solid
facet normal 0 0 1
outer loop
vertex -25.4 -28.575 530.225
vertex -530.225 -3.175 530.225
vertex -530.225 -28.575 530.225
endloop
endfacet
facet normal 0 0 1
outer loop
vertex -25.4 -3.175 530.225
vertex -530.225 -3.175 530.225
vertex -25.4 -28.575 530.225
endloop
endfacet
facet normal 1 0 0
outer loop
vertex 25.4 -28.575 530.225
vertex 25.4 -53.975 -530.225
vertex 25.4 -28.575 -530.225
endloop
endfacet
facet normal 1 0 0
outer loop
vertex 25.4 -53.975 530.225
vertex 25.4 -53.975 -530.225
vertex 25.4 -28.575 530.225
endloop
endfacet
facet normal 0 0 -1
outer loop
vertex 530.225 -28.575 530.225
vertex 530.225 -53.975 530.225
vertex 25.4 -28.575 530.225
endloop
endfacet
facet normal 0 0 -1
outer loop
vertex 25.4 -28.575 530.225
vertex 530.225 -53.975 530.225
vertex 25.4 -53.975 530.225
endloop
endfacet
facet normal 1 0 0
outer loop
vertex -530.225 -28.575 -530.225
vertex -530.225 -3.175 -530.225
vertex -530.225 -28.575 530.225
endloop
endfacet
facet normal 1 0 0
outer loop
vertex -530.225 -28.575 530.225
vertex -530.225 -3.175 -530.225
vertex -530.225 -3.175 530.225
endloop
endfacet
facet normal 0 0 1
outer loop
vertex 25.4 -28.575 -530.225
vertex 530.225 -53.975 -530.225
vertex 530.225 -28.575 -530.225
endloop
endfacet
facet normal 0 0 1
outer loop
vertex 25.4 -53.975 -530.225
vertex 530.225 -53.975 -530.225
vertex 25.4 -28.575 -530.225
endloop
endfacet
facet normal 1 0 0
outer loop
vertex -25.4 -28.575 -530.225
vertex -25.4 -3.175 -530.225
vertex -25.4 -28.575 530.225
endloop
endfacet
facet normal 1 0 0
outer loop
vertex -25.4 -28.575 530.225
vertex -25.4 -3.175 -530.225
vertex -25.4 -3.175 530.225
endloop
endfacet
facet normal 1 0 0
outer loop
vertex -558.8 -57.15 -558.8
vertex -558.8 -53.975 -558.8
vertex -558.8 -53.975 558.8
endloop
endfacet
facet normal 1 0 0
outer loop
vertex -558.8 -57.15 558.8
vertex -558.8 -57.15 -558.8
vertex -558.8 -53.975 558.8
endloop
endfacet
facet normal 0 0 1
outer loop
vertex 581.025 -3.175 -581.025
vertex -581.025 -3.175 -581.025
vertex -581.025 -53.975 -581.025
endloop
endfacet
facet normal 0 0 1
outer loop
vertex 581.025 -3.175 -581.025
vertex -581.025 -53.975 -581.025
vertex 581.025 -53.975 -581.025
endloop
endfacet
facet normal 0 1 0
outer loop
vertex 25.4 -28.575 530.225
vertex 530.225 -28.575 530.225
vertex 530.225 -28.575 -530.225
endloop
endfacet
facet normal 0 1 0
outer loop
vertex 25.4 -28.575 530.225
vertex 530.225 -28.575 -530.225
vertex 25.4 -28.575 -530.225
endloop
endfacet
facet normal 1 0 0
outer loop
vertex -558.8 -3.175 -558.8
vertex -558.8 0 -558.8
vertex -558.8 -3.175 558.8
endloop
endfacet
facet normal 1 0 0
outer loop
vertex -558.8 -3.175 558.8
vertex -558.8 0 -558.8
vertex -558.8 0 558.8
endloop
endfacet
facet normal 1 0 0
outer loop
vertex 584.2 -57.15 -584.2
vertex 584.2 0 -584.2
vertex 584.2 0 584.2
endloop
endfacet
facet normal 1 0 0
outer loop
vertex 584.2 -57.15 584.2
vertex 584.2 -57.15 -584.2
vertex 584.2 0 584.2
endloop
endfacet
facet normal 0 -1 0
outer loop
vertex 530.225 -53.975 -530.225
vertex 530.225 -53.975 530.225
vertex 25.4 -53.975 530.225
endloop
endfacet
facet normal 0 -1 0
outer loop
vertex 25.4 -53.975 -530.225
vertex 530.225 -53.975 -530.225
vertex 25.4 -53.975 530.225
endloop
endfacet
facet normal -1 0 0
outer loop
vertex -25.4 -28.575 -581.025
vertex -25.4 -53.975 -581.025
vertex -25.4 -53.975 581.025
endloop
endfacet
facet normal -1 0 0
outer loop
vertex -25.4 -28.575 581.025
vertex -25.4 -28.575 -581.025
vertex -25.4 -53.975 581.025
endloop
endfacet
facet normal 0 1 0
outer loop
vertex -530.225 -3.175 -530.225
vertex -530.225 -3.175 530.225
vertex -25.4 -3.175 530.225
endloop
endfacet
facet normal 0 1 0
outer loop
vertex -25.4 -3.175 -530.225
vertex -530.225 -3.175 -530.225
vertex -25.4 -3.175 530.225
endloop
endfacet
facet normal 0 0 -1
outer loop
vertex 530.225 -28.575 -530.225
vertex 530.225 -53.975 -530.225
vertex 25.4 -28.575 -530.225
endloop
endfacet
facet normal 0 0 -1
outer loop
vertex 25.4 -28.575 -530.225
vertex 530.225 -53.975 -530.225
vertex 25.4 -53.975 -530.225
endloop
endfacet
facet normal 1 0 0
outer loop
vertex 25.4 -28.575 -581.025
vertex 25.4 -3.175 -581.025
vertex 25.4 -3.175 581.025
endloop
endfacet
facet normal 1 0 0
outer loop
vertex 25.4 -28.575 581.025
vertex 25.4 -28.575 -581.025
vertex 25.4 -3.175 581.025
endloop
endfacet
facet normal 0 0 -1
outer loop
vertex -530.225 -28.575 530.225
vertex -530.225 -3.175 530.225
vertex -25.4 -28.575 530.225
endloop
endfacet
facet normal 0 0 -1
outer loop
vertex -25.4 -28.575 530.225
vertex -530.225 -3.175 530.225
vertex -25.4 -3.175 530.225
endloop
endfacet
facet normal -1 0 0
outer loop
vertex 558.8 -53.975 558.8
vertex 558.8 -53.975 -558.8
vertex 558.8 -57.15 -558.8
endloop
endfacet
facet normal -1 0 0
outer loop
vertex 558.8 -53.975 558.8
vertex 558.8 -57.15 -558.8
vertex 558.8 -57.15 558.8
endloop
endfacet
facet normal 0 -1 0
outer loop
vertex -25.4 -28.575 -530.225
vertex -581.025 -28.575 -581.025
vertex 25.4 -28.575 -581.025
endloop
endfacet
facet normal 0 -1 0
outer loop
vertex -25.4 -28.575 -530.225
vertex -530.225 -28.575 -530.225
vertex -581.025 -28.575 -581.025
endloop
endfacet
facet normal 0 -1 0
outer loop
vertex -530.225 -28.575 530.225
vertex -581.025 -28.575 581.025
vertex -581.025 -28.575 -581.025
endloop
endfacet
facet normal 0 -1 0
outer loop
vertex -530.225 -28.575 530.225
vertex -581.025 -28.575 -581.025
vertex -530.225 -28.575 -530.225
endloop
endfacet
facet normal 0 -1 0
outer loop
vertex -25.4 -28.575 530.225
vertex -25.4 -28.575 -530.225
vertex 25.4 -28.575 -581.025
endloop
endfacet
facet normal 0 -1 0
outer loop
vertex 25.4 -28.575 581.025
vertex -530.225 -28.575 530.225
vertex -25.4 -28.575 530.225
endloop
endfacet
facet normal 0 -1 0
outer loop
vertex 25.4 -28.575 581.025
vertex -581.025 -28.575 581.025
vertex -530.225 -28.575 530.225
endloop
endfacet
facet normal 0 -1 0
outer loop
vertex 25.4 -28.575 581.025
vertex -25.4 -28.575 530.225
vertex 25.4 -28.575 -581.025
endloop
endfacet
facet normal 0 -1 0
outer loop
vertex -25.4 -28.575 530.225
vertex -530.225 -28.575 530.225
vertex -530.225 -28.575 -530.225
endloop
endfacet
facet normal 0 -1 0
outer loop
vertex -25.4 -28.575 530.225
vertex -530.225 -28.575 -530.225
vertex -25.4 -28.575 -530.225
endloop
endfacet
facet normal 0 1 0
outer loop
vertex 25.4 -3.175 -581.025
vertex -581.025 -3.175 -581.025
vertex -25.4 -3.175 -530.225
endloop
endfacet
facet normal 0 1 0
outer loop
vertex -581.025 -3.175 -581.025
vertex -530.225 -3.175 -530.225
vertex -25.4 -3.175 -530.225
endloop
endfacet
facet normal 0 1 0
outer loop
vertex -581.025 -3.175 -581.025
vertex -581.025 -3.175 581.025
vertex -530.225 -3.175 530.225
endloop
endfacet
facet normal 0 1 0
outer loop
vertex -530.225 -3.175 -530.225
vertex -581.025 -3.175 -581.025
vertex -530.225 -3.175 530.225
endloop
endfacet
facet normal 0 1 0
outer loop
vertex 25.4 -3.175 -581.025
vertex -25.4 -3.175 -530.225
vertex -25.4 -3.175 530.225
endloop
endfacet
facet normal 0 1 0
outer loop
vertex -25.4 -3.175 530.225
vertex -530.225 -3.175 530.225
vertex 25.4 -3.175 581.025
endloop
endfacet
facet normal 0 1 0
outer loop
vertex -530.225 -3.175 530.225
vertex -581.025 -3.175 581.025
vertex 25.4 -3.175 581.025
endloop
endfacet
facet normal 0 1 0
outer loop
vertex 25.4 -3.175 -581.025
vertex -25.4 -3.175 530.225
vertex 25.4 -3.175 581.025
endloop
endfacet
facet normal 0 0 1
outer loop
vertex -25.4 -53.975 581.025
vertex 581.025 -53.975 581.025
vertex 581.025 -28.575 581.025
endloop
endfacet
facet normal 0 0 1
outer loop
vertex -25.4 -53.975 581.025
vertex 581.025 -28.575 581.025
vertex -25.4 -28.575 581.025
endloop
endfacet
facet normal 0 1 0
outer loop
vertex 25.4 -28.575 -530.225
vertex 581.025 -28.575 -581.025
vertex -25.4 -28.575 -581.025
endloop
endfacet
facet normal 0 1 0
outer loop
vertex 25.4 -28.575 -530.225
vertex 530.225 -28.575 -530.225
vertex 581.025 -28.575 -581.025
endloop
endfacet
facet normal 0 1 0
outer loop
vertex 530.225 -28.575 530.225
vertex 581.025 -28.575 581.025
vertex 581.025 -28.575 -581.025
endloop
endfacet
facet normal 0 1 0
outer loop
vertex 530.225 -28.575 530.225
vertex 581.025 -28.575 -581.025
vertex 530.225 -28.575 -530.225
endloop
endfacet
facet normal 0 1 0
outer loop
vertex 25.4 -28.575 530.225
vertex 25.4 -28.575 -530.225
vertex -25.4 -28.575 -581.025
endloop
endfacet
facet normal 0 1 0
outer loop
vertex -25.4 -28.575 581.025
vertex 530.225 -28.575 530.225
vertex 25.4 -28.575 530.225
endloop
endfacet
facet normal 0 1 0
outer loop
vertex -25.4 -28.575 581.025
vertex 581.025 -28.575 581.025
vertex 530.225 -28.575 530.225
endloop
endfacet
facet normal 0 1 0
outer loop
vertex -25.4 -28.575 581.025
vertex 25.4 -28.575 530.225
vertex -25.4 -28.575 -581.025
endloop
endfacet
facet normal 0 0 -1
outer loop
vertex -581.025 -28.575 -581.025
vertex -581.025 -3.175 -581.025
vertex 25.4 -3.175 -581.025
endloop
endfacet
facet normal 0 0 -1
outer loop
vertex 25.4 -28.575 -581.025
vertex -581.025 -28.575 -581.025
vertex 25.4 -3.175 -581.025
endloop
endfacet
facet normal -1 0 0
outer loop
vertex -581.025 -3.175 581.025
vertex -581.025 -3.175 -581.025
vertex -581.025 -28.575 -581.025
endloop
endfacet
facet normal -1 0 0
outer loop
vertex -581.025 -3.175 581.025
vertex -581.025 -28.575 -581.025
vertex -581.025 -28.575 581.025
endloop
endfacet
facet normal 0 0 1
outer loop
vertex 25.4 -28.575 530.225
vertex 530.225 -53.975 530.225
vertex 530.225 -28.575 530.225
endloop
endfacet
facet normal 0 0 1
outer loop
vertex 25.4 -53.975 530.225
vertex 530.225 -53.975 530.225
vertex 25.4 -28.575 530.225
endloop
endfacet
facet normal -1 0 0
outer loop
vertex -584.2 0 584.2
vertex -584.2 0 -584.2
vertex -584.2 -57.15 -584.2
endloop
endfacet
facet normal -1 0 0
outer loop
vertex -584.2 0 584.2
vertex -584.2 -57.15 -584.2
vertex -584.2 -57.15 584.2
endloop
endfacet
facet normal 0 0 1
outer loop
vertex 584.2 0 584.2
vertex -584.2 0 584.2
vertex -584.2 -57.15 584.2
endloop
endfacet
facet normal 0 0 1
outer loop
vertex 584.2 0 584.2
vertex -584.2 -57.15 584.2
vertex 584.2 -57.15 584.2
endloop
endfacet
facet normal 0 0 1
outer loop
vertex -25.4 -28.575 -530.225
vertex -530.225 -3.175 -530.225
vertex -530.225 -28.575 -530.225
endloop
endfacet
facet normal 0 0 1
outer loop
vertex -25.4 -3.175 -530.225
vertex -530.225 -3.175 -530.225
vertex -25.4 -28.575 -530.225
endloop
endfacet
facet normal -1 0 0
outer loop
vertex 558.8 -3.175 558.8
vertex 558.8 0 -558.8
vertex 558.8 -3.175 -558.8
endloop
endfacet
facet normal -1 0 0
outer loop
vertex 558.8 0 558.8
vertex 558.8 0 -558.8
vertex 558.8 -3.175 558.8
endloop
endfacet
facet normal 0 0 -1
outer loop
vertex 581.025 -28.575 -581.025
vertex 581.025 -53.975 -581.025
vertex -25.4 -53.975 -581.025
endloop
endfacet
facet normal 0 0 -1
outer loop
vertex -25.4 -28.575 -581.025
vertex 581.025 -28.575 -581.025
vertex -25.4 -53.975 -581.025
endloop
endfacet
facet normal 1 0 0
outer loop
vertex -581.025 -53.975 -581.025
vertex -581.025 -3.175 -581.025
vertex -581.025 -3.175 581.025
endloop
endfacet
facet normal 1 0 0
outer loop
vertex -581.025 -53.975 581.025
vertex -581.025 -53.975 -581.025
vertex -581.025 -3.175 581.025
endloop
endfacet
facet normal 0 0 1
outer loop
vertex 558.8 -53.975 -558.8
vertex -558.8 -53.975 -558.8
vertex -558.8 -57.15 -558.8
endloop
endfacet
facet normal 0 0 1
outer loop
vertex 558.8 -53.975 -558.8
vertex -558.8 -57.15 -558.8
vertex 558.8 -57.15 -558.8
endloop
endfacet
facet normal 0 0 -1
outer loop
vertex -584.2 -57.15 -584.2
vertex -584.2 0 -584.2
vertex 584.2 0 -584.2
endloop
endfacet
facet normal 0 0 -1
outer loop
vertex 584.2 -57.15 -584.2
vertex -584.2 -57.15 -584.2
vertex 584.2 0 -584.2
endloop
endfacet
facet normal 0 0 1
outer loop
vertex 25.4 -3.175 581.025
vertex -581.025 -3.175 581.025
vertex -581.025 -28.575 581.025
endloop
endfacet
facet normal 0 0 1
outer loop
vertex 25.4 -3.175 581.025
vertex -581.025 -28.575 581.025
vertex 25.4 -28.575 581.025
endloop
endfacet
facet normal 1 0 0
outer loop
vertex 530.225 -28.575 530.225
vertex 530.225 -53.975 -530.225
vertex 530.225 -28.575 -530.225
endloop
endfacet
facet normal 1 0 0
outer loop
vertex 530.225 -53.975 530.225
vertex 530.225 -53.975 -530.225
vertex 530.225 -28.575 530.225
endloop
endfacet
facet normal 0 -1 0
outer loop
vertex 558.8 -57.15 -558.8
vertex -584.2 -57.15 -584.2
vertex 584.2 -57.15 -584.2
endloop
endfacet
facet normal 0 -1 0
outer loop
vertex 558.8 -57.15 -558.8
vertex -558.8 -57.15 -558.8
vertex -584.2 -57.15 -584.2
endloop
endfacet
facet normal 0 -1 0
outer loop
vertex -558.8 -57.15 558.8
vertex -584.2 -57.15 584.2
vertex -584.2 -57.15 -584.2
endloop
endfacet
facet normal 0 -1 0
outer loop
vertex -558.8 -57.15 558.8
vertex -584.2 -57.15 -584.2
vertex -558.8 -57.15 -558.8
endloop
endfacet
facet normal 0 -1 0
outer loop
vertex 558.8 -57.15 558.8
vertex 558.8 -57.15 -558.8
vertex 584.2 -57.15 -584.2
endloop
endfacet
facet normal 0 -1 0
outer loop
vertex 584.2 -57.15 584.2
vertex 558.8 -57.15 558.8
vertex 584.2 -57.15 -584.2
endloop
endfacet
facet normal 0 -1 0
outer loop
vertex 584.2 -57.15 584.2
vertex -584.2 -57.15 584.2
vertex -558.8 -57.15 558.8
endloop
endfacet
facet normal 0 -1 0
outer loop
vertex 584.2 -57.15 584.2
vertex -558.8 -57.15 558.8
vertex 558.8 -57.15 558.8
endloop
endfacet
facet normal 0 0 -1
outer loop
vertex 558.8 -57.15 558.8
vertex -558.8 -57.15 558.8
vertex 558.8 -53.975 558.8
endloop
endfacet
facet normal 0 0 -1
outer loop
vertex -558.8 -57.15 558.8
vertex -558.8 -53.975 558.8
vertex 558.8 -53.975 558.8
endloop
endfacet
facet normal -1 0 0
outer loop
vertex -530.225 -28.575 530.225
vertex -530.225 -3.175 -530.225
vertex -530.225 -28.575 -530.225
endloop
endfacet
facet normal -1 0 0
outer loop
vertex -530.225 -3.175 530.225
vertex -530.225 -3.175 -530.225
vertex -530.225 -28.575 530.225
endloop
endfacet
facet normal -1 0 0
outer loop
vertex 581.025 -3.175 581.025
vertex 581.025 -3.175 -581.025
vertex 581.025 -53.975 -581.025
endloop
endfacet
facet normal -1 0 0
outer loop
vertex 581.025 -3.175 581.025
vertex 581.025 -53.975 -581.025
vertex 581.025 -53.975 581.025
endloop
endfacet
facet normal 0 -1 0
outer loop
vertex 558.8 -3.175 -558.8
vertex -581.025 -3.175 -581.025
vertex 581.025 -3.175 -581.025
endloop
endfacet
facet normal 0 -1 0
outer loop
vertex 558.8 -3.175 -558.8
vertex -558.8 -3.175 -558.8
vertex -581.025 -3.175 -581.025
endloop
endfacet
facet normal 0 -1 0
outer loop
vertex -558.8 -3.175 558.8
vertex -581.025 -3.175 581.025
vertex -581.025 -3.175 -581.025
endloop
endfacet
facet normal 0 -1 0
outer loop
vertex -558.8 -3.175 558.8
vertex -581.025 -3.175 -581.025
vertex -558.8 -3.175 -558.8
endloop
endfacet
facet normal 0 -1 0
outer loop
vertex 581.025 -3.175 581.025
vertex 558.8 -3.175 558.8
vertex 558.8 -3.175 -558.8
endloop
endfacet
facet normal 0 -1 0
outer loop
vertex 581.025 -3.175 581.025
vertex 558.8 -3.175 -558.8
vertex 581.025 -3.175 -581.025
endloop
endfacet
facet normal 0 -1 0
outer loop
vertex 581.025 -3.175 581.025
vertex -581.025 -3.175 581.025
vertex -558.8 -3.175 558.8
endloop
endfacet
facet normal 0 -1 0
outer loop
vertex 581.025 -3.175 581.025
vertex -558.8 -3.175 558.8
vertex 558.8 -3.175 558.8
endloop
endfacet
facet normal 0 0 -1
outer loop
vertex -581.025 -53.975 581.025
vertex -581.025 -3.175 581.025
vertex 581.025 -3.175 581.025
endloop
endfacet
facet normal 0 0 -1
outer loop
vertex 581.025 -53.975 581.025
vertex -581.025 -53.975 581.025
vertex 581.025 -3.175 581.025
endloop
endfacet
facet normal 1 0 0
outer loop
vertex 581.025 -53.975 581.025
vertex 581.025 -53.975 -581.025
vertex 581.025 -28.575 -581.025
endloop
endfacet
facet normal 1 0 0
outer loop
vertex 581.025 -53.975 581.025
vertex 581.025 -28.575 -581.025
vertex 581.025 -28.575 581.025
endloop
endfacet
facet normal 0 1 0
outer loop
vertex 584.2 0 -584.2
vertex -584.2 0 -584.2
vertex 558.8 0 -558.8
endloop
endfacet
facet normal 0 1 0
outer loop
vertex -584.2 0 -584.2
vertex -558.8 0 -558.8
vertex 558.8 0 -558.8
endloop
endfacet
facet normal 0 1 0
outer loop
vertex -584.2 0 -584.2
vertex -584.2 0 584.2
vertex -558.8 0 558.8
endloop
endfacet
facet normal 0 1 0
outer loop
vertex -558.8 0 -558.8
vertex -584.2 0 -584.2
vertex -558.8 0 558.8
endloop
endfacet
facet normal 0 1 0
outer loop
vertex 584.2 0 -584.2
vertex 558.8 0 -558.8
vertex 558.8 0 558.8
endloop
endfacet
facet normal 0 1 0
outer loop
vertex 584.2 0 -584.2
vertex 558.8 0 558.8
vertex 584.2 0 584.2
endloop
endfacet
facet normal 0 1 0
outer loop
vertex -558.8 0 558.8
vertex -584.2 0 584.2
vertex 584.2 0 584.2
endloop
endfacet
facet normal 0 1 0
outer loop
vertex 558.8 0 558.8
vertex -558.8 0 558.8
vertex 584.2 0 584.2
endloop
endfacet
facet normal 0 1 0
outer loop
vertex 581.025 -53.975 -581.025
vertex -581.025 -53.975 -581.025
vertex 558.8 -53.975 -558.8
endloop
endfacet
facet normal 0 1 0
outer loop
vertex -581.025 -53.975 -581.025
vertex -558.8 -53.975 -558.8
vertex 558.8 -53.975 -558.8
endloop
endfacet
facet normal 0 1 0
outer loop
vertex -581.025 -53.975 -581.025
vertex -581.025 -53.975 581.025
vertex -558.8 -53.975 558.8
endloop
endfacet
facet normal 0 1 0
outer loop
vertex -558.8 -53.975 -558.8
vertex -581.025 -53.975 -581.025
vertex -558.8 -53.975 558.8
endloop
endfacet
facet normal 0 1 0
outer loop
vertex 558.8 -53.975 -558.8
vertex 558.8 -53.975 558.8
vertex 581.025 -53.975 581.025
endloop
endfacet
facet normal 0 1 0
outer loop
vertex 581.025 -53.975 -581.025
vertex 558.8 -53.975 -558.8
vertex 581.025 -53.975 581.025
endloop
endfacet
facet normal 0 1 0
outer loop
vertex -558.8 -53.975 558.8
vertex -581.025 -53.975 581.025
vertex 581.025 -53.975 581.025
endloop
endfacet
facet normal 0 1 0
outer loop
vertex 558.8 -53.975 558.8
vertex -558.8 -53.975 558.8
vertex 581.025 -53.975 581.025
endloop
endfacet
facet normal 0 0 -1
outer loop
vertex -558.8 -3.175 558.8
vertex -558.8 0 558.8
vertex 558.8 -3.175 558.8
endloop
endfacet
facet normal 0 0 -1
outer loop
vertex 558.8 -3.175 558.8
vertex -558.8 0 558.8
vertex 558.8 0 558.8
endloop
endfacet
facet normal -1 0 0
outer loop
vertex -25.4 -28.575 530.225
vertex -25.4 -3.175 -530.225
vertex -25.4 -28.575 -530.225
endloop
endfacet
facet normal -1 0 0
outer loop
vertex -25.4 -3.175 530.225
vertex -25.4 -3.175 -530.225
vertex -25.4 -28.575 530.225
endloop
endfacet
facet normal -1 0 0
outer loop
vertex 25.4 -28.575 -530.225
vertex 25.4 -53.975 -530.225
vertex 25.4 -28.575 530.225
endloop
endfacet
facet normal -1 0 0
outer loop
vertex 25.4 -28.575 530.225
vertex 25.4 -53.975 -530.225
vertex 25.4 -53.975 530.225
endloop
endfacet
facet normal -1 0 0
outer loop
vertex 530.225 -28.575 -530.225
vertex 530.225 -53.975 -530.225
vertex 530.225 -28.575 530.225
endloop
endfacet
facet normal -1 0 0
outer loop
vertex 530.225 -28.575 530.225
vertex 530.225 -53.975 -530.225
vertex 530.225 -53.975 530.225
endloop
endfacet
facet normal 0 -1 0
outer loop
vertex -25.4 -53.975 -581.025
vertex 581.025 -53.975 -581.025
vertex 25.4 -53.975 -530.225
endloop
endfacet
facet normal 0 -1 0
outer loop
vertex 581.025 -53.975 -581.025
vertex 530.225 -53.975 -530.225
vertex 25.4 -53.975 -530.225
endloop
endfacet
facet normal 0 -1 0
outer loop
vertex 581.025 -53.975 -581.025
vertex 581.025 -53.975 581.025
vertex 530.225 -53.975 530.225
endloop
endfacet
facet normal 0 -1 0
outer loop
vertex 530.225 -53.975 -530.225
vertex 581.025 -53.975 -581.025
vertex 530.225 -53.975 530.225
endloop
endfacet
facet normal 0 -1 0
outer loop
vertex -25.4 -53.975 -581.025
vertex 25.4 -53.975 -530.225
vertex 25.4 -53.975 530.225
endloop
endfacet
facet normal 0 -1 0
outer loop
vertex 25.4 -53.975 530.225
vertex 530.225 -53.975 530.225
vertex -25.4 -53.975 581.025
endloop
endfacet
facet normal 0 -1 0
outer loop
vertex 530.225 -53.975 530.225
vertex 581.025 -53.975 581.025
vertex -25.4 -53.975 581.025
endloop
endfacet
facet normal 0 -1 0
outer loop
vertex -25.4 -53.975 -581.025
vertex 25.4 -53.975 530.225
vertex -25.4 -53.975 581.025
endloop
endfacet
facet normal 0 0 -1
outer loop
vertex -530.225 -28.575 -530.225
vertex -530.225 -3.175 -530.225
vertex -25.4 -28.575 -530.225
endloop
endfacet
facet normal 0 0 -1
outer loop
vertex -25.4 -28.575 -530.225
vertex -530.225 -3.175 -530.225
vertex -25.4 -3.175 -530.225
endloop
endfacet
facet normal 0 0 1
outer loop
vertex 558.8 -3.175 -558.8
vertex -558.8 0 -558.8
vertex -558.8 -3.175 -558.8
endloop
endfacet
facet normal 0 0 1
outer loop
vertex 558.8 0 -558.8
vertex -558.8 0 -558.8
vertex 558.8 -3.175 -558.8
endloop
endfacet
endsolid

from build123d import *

# Parameters (mm, degrees)
F0_W     = 1168.4
F0_H     = 1168.4
F0_W_2   = 1117.6
F0_H_2   = 1117.6
F1_DEPTH = 57.15
F2_T     = -3.175
F3_W     = 606.425
F3_H     = 1162.05
F3_W_2   = 504.825
F3_H_2   = 1060.45
F4_DEPTH = 25.4
F5_W     = 606.425
F5_H     = 1162.05
F5_W_2   = 504.825
F5_H_2   = 1060.45
F6_DEPTH = 25.4
F7_DEPTH = 25.4
F8_DEPTH = 25.4


with BuildPart() as f1:
    # F0 (on Front) → F1 (new body)
    with BuildSketch(Plane.XZ):
        Rectangle(F0_W, F0_H)
        Rectangle(F0_W_2, F0_H_2, mode=Mode.SUBTRACT)
    extrude(amount=F1_DEPTH)

    # F2
    f2_openings = [f1.faces().sort_by_distance(p)[0] for p in [
        (558.8, -28.575, 0),
        (0, -28.575, 558.8),
        (-558.8, -28.575, 0),
        (0, -28.575, -558.8),
    ]]
    offset(amount=F2_T, openings=f2_openings)


with BuildPart() as f4:
    # F3 (on face) → F4 (new body)
    with BuildSketch(Plane.XZ.offset(3.175)):
        with Locations((-277.8125, 0)):
            Rectangle(F3_W, F3_H)
        with Locations((-277.8125, 0)):
            Rectangle(F3_W_2, F3_H_2, mode=Mode.SUBTRACT)
    extrude(amount=F4_DEPTH)


with BuildPart() as f6:
    # F5 (on face) → F6 (new body)
    with BuildSketch(Plane(origin=(0, -53.975, 0), x_dir=(-1, 0, 0), z_dir=(0, 1, 0))):
        with Locations((-277.8125, 0)):
            Rectangle(F5_W, F5_H)
        with Locations((-277.8125, 0)):
            Rectangle(F5_W_2, F5_H_2, mode=Mode.SUBTRACT)
    extrude(amount=F6_DEPTH)


with BuildPart() as f7:
    # F3 (on face) → F7 (new body)
    with BuildSketch(Plane.XZ.offset(3.175)):
        with Locations((-277.8125, 0)):
            Rectangle(F3_W_2, F3_H_2)
    extrude(amount=F7_DEPTH)


with BuildPart() as f8:
    # F5 (on face) → F8 (new body)
    with BuildSketch(Plane(origin=(0, -53.975, 0), x_dir=(-1, 0, 0), z_dir=(0, 1, 0))):
        with Locations((-277.8125, 0)):
            Rectangle(F5_W_2, F5_H_2)
    extrude(amount=F8_DEPTH)


solid = Compound([f1.part, f4.part, f6.part, f7.part, f8.part])
